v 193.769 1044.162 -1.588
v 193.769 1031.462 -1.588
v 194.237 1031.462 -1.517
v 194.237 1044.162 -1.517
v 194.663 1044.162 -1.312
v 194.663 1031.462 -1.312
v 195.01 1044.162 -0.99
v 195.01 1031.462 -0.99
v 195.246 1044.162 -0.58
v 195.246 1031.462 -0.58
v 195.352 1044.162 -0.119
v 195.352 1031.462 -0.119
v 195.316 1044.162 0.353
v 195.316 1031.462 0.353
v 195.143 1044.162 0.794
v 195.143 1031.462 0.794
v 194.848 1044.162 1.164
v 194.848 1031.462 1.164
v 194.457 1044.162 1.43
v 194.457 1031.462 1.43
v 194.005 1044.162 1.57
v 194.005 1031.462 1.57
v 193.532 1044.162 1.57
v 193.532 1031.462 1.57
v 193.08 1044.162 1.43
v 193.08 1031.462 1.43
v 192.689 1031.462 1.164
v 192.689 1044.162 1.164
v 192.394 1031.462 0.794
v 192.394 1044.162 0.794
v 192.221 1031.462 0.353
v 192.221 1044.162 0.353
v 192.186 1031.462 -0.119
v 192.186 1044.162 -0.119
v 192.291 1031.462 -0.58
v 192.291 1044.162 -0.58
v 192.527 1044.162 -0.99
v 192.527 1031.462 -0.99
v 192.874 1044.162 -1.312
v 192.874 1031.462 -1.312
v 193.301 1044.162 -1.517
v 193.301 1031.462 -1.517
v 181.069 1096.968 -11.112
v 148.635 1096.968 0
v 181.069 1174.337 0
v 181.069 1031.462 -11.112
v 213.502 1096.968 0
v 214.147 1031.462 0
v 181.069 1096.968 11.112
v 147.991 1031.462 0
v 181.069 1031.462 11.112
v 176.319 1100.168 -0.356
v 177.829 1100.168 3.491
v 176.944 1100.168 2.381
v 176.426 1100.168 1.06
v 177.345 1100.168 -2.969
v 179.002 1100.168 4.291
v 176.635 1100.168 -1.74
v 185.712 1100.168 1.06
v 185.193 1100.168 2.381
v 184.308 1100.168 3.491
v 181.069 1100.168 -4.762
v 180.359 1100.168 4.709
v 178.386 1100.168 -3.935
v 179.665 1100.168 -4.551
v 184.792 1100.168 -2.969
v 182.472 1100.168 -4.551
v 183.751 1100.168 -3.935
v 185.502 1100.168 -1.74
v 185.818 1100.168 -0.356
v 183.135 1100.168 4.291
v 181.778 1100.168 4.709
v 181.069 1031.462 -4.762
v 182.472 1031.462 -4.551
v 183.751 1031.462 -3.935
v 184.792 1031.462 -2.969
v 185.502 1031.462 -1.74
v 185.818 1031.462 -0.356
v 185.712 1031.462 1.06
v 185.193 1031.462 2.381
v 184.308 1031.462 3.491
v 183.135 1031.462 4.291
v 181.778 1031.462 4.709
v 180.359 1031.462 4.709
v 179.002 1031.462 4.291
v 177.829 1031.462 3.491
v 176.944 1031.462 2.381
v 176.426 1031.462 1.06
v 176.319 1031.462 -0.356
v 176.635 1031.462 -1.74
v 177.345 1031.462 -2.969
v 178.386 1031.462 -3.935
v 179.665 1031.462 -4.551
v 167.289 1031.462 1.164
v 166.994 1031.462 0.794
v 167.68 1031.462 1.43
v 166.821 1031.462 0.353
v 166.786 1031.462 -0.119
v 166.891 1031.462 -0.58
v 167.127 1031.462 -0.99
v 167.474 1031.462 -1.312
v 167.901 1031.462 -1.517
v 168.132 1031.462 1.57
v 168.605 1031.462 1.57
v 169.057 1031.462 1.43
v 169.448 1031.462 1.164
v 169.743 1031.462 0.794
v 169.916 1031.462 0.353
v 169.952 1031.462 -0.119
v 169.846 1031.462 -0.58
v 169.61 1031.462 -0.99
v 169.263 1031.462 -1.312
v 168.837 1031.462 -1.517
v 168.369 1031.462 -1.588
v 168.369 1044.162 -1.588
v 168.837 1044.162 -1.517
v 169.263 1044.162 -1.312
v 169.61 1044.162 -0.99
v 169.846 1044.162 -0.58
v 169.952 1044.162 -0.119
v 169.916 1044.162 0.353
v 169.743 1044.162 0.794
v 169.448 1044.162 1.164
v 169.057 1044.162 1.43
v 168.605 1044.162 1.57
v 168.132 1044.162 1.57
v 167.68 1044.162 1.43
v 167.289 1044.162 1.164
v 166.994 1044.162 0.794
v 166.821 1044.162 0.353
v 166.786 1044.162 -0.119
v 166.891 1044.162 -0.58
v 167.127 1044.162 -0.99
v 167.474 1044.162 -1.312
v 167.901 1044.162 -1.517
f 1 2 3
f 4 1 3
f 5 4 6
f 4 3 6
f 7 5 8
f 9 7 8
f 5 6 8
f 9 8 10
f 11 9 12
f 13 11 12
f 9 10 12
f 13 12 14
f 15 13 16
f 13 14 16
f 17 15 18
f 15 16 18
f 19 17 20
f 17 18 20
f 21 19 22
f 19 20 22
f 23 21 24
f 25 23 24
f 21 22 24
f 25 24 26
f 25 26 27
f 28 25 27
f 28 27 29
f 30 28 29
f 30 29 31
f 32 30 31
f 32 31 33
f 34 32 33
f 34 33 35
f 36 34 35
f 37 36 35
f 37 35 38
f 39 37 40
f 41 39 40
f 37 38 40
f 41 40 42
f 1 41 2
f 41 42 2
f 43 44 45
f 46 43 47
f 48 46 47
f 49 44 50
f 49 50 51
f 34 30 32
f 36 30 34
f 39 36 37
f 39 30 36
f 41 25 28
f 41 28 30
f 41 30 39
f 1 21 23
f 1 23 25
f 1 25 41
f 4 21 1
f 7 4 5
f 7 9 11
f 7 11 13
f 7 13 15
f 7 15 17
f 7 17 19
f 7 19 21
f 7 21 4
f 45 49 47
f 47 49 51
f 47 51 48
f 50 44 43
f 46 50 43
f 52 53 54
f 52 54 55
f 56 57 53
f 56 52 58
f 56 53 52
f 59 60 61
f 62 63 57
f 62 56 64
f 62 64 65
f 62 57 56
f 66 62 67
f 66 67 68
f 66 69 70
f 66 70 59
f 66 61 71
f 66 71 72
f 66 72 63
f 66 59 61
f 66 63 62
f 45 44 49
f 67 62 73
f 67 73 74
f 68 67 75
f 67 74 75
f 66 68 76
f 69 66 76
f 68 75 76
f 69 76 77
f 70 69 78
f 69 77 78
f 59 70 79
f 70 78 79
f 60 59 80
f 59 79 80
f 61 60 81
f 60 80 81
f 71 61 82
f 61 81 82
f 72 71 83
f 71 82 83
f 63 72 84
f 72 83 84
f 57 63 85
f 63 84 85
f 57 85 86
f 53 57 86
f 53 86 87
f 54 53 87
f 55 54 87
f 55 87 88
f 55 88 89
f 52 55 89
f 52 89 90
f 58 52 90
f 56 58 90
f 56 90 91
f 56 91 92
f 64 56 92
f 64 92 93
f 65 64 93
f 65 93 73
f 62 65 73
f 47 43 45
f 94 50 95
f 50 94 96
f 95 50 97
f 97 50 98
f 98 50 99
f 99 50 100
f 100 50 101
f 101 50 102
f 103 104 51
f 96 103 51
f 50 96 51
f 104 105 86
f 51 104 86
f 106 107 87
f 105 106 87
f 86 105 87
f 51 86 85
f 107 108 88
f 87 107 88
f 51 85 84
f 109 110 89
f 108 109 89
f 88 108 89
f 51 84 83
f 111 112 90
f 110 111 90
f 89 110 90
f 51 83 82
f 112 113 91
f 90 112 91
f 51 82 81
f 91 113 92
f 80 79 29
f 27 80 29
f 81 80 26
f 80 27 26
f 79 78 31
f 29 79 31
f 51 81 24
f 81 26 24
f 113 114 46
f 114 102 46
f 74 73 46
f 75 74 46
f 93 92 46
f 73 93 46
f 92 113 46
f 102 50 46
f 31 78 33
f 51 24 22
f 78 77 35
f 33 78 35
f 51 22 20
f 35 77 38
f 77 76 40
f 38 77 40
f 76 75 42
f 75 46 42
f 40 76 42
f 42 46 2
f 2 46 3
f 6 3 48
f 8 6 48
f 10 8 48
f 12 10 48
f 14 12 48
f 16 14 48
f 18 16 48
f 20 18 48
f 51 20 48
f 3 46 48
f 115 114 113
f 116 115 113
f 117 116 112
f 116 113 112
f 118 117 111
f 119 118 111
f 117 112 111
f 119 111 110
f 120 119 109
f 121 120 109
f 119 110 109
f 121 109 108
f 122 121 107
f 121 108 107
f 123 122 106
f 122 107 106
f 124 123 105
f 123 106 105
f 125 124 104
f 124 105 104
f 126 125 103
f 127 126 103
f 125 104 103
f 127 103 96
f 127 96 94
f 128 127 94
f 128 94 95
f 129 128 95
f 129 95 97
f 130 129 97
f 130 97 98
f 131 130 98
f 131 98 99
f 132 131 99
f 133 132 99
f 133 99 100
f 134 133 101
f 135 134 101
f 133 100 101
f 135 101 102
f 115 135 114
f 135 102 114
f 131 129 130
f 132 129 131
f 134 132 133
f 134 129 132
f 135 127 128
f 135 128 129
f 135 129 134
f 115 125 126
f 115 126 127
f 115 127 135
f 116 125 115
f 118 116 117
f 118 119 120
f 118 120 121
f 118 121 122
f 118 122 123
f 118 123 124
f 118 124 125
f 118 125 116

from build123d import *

# Parameters (mm, degrees)
BOSS_EXTRUDE1_DEPTH      = 11.1125
BOSS_EXTRUDE1_DEPTH_BACK = 11.1125
SKETCH5_W                = 109.877468776
SKETCH5_H                = 283.051122129
CUT_EXTRUDE2_DEPTH       = 1193.492852366
SKETCH6_W                = 149.121482991
SKETCH6_H                = 108.921761737
CUT_EXTRUDE3_DEPTH       = 1175.662940665
SKETCH7_R                = 4.7625
CUT_EXTRUDE4_DEPTH       = 635
CUT_EXTRUDE8_DEPTH       = 1195.766301895
CUT_EXTRUDE8_DEPTH_BACK  = 1195.766301895
SKETCH8_W                = 149.774750394
SKETCH8_H                = 148.832770831
SKETCH8_H_2              = 142.875
SKETCH17_R               = 1.5875
CUT_EXTRUDE15_DEPTH      = 12.7


with BuildPart() as part:
    # Sketch1 → Boss-Extrude1 (new, two sides: drawn at the far end of the back side and taken through both)
    with BuildSketch(Plane.XY.offset(-BOSS_EXTRUDE1_DEPTH_BACK)):
        Polygon((142.42123069, 465.168027231), (219.716026672, 465.168027231), (213.502471629, 1096.967634552), (181.068628681, 1174.337215652), (148.634785732, 1096.967634552), align=None)
    extrude(amount=BOSS_EXTRUDE1_DEPTH + BOSS_EXTRUDE1_DEPTH_BACK)

    # Sketch2 → Cut-Loft1 section 0
    with BuildSketch(Plane.XZ.offset(-465.168027231)):
        with BuildLine():
            Line((142.42123069, 0), (181.068628681, 11.1125))
            Line((181.068628681, 11.1125), (219.716026672, 0))
            Line((219.716026672, 0), (222.70513775, 0))
            Line((222.70513775, 0), (222.70513775, 15.258366339))
            Line((222.70513775, 15.258366339), (137.848628215, 15.258366339))
            Line((137.848628215, 15.258366339), (137.848628215, 0))
            Line((137.848628215, 0), (142.42123069, 0))
        make_face()
    # Sketch3 → Cut-Loft1 section 1
    with BuildSketch(Plane(origin=(0, 1096.967634552, 0), x_dir=(1, 0, 0), z_dir=(0, 1, 0))):
        with BuildLine():
            Line((213.502471629, 0), (181.068628681, -11.1125))
            Line((181.068628681, -11.1125), (148.634785732, 0))
            Line((148.634785732, 0), (137.848628215, 0))
            Line((137.848628215, 0), (137.848628215, -15.258366339))
            Line((137.848628215, -15.258366339), (222.70513775, -15.258366339))
            Line((222.70513775, -15.258366339), (222.70513775, 0))
            Line((222.70513775, 0), (213.502471629, 0))
        make_face()
    cut_loft1 = loft(mode=Mode.SUBTRACT)

    # Mirror1: Cut-Loft1 across plane
    add(cut_loft1.mirror(Plane.XY), mode=Mode.SUBTRACT)

    # Sketch5 → Cut-Extrude2 (cut, through all)
    with BuildSketch(Plane(origin=(-32.103098407, 13.457832356, 93.698704331), x_dir=(0.9470206004067627, 0.045661094409327196, 0.31791043842968925), z_dir=(-0.3211728232668741, 0.1346377834927197, 0.937401026696127))):
        with Locations((219.349244299, 1139.303724701)):
            Rectangle(SKETCH5_W, SKETCH5_H)
    cut_extrude2 = extrude(amount=CUT_EXTRUDE2_DEPTH, mode=Mode.SUBTRACT)

    # Sketch6 → Cut-Extrude3 (cut, through all)
    with BuildSketch(Plane(origin=(69.458274406, 29.117370568, 202.726547902), x_dir=(0.9470206004067623, -0.045661094409327495, -0.31791043842969063), z_dir=(0.3211728232668754, 0.13463778349272, 0.9374010266961263))):
        with Locations((131.752816965, 1118.922251835)):
            Rectangle(SKETCH6_W, SKETCH6_H)
    cut_extrude3 = extrude(amount=CUT_EXTRUDE3_DEPTH, mode=Mode.SUBTRACT)

    # Mirror2: Cut-Extrude2, Cut-Extrude3 across plane
    add(cut_extrude2.mirror(Plane.XY), mode=Mode.SUBTRACT)
    add(cut_extrude3.mirror(Plane.XY), mode=Mode.SUBTRACT)

    # Sketch7 → Cut-Extrude4 (cut)
    with BuildSketch(Plane.XZ.offset(-465.168027231)):
        with Locations(Location((181.068628681, 0, 0), (0, 0, 270))):
            Circle(SKETCH7_R)
    extrude(amount=-CUT_EXTRUDE4_DEPTH, mode=Mode.SUBTRACT)

    # Sketch8 → Cut-Extrude8 (cut, two sides: drawn at the far end of the back side and taken through both)
    with BuildSketch(Plane.XY.offset(-CUT_EXTRUDE8_DEPTH_BACK)):
        with Locations((180.5976389, 528.420830237)):
            Rectangle(SKETCH8_W, SKETCH8_H)
        with Locations((180.5976389, 674.274715652)):
            Rectangle(SKETCH8_W, SKETCH8_H_2)
        with Locations((180.5976389, 817.149715652)):
            Rectangle(SKETCH8_W, SKETCH8_H_2)
        with Locations((180.5976389, 960.024715652)):
            Rectangle(SKETCH8_W, SKETCH8_H_2)
    extrude(amount=CUT_EXTRUDE8_DEPTH + CUT_EXTRUDE8_DEPTH_BACK, mode=Mode.SUBTRACT)

    # Sketch17 → Cut-Extrude15 (cut)
    with BuildSketch(Plane.XZ.offset(-1031.462215652)):
        with Locations(Location((168.368628681, 0, 0), (0, 0, 270))):
            Circle(SKETCH17_R)
        with Locations(Location((193.768628681, 0, 0), (0, 0, 270))):
            Circle(SKETCH17_R)
    extrude(amount=-CUT_EXTRUDE15_DEPTH, mode=Mode.SUBTRACT)


solid = part.part
